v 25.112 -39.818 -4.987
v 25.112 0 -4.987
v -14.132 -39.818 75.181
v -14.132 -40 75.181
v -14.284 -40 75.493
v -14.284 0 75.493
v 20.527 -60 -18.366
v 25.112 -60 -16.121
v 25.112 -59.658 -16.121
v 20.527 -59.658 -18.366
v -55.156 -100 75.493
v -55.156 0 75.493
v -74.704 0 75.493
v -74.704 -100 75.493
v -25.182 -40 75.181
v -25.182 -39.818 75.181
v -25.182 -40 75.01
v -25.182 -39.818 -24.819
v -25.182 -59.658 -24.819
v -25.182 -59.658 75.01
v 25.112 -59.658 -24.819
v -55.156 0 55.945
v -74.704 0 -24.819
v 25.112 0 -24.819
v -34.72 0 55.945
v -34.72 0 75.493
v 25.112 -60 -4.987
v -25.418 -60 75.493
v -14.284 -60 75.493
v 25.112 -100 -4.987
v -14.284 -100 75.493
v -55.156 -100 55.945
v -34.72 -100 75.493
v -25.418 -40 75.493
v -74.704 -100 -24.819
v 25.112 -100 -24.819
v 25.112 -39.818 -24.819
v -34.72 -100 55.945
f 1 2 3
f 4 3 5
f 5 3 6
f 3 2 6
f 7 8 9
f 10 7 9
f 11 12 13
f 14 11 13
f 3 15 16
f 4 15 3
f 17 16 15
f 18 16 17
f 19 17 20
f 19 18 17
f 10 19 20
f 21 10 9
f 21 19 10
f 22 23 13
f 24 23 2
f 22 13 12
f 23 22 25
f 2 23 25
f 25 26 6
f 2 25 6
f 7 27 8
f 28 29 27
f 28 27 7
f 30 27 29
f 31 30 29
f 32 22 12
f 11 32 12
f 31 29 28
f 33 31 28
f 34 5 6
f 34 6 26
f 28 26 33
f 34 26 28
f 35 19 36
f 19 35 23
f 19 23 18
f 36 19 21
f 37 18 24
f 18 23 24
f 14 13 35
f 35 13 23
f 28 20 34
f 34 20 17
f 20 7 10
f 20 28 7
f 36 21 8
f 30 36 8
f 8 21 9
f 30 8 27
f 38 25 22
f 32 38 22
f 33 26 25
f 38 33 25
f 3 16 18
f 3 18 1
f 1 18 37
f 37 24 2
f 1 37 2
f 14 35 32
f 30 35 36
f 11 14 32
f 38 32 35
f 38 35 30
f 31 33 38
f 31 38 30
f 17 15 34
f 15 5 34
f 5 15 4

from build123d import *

# Parameters (mm, degrees)
F1_DEPTH = 100
F2_W     = 20
F2_H     = 89.6053736129
F3_DEPTH = 10
F4_DEPTH = 10
F5_DEPTH = 10
F6_W     = 50.2936672419
F6_H     = 19.8401175439
F7_DEPTH = 100


with BuildPart() as f1:
    # F0 (on Front) → F1 (new body)
    with BuildSketch(Plane.XZ):
        Polygon((-55.1563166082, 75.4929259419), (-74.7038125992, 75.4929259419), (-74.7038125992, -24.8185619712), (25.1119807363, -24.8185619712), (25.1119807363, -4.9872435629), (-14.2842791975, 75.4929259419), (-34.7202979028, 75.4929259419), (-34.7202979028, 55.9454262257), (-55.1563166082, 55.9454262257), align=None)
    extrude(amount=F1_DEPTH)

    # F2 (on face) → F3 (cut)
    with BuildSketch(Plane(origin=(18.2883118785, 0, 8.9524052067), x_dir=(0, 1, 0), z_dir=(0.8981623117, 0, 0.4396640329))):
        with Locations((-50, 29.2824978739)):
            Rectangle(F2_W, F2_H)
    extrude(amount=-F3_DEPTH, mode=Mode.SUBTRACT)

    # F4 (cut): a face of the model
    f4_faces = [f1.faces().sort_by_distance(p)[0] for p in [
        (-18.775090756, -50, 73.2946057774),
    ]]
    extrude(f4_faces, amount=-F4_DEPTH, mode=Mode.SUBTRACT)

    # F5 (cut): a face of the model
    f5_faces = [f1.faces().sort_by_distance(p)[0] for p in [
        (20.6211691778, -50, -7.1855637275),
    ]]
    extrude(f5_faces, amount=-F5_DEPTH, mode=Mode.SUBTRACT)

    # F6 (on face) → F7 (cut)
    with BuildSketch(Plane(origin=(0, 0, -24.8185619712), x_dir=(1, 0, 0), z_dir=(0, 0, -1))):
        with Locations((-0.0348528847, 49.7383717448)):
            Rectangle(F6_W, F6_H)
    extrude(amount=-F7_DEPTH, mode=Mode.SUBTRACT)


solid = f1.part
